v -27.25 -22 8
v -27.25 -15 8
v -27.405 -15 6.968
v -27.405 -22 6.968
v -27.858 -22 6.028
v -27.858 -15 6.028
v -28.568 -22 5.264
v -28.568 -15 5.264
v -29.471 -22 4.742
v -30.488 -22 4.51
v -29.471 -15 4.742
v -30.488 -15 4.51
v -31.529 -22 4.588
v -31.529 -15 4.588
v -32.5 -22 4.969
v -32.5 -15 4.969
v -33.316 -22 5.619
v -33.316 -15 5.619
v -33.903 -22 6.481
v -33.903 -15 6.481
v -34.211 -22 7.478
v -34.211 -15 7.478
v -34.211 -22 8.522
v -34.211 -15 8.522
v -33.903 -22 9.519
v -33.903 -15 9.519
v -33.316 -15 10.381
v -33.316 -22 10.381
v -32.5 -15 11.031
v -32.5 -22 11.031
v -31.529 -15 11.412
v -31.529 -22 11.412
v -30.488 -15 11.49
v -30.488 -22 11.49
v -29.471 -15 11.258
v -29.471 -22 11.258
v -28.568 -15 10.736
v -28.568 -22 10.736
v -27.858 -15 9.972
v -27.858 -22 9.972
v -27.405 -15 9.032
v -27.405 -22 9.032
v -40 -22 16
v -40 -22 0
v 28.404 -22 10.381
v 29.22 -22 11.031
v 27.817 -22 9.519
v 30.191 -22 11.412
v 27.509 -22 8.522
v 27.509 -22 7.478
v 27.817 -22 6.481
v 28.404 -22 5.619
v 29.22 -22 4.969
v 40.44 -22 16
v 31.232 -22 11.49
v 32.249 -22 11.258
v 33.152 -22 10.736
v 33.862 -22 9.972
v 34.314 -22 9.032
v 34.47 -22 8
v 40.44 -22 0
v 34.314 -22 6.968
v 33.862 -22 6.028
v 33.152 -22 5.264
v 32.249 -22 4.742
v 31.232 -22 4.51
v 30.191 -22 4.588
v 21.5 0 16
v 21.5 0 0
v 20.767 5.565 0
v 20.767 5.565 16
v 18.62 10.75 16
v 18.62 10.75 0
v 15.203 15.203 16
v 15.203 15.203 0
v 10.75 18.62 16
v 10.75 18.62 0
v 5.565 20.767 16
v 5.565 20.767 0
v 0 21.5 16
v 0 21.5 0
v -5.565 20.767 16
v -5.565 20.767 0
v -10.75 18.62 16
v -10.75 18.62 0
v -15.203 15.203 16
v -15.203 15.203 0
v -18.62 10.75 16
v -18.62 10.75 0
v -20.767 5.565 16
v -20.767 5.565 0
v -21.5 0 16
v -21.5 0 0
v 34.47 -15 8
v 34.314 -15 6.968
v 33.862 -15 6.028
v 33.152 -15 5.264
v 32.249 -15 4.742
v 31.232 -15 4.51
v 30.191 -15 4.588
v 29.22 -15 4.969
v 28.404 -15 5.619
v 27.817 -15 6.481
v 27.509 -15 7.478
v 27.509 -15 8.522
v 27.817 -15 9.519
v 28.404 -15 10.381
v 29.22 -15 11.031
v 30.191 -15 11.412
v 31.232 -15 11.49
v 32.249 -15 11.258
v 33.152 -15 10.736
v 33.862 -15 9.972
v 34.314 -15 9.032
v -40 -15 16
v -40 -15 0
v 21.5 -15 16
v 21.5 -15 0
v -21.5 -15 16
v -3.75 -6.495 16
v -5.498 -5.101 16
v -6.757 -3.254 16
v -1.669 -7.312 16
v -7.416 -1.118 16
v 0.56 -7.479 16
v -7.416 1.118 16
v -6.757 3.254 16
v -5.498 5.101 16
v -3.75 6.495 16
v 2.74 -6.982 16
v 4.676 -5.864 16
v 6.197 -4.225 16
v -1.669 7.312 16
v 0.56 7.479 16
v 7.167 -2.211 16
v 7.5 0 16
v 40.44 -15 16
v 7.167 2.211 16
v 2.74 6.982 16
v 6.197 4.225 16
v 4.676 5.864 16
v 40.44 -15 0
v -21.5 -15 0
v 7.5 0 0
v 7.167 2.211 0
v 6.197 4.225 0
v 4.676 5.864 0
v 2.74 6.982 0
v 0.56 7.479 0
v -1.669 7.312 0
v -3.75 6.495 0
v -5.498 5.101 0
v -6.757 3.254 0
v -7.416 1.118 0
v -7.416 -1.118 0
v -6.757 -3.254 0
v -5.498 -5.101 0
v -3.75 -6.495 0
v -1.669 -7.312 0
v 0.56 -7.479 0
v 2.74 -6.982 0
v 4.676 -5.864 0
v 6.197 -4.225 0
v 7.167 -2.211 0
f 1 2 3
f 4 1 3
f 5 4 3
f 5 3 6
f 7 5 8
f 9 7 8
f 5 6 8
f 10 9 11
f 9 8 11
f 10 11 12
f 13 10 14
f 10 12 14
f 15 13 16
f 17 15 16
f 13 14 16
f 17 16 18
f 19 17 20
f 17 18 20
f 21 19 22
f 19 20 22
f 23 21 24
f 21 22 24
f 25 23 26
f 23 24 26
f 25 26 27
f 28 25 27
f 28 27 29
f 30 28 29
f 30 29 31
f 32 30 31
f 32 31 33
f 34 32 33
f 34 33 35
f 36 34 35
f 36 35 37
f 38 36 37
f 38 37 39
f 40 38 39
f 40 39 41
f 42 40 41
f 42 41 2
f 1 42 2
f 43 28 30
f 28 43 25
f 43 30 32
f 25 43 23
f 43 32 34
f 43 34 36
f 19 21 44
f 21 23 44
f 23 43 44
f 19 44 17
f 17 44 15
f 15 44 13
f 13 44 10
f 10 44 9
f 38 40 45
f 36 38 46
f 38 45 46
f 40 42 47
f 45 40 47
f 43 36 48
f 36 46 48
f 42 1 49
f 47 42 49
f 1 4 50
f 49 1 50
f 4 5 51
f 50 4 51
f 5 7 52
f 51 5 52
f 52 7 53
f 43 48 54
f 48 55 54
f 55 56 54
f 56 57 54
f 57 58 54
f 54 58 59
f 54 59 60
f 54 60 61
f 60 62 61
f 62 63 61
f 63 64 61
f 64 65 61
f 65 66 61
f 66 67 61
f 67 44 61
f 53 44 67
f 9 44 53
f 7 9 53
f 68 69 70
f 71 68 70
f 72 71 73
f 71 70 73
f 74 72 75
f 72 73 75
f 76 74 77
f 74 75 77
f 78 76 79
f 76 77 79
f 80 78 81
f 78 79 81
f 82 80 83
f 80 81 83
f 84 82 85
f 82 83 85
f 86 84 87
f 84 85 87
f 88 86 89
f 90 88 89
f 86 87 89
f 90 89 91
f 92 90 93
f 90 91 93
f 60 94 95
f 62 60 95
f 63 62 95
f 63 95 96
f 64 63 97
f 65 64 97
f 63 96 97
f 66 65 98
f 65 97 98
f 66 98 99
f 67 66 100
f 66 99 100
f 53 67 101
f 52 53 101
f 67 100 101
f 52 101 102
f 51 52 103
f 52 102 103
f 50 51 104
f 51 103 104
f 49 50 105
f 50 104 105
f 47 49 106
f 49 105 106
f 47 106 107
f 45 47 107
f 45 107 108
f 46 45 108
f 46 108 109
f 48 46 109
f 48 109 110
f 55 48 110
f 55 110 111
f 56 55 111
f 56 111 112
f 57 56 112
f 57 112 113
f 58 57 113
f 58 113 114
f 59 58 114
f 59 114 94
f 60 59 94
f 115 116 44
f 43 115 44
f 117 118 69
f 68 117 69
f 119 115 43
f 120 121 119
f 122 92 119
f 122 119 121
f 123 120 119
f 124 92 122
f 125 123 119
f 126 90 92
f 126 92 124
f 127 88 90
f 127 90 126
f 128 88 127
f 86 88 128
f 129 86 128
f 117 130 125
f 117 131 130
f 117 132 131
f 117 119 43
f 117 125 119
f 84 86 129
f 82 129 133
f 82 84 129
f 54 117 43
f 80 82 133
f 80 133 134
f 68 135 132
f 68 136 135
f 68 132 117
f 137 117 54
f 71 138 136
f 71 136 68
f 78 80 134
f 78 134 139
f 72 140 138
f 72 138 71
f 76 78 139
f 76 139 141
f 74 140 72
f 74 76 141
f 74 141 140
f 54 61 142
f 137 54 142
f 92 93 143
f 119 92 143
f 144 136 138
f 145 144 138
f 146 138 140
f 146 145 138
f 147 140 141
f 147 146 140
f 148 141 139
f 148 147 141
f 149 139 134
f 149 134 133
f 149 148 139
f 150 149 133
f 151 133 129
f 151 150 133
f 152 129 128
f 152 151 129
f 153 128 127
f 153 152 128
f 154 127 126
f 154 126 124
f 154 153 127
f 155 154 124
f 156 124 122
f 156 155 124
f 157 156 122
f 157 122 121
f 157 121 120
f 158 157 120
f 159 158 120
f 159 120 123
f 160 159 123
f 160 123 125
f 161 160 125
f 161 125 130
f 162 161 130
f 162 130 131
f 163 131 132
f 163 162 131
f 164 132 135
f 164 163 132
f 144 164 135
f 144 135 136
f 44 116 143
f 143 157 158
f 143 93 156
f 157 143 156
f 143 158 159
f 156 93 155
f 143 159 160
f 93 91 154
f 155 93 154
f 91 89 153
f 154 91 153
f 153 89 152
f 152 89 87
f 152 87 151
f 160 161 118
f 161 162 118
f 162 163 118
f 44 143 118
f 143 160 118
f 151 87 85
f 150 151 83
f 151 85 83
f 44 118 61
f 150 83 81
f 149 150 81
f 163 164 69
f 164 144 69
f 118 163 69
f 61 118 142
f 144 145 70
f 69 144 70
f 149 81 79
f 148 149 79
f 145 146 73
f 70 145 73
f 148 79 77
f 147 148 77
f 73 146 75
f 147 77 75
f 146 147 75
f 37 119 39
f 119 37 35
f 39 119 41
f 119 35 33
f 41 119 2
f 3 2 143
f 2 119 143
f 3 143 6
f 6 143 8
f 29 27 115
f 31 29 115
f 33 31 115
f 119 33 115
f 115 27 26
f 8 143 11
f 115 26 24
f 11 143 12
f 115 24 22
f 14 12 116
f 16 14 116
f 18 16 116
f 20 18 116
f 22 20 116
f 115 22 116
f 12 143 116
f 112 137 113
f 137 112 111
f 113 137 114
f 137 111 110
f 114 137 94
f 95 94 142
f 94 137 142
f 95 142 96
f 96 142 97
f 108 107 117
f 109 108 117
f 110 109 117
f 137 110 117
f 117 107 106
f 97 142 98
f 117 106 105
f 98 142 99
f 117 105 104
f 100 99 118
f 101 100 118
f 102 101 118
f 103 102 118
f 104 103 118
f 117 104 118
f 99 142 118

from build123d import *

# Parameters (mm, degrees)
SKETCH_1_R          = 7.5
EXTRUDE_2_DEPTH     = 16
SKETCH_2_R          = 3.5
CUT_EXTRUDE_1_DEPTH = 16


with BuildPart() as part:
    # 草图1 → 凸台-拉伸2 (new body)
    with BuildSketch(Plane.XY):
        with BuildLine():
            Line((15.402921801, -15), (21.5, -15))
            Line((21.5, -15), (21.5, 0))
            ThreePointArc((21.5, 0), (19.917490037, -8.095899619), (15.402921801, -15))
        make_face()
        with BuildLine():
            ThreePointArc((21.5, 0), (0, 21.5), (-21.5, 0))
            ThreePointArc((-21.5, 0), (-19.917490037, -8.095899619), (-15.402921801, -15))
            Line((-15.402921801, -15), (15.402921801, -15))
            ThreePointArc((15.402921801, -15), (19.917490037, -8.095899619), (21.5, 0))
        make_face()
        Circle(SKETCH_1_R, mode=Mode.SUBTRACT)
        with BuildLine():
            Line((-21.5, 0), (-21.5, -15))
            Line((-21.5, -15), (-15.402921801, -15))
            ThreePointArc((-15.402921801, -15), (-19.917490037, -8.095899619), (-21.5, 0))
        make_face()
        with BuildLine():
            Line((-40, -22), (0, -22))
            Line((0, -22), (40, -22))
            Line((40, -22), (40.439940075, -22))
            Line((40.439940075, -22), (40.439940075, -15))
            Line((40.439940075, -15), (21.5, -15))
            Line((21.5, -15), (15.402921801, -15))
            ThreePointArc((15.402921801, -15), (0, -21.5), (-15.402921801, -15))
            Line((-15.402921801, -15), (-21.5, -15))
            Line((-21.5, -15), (-40, -15))
            Line((-40, -15), (-40, -22))
        make_face()
        with BuildLine():
            Line((15.402921801, -15), (-15.402921801, -15))
            ThreePointArc((-15.402921801, -15), (0, -21.5), (15.402921801, -15))
        make_face()
    extrude(amount=EXTRUDE_2_DEPTH)

    # 草图2 → 切除-拉伸1 (cut)
    with BuildSketch(Plane(origin=(0, -15, 0), x_dir=(1, 0, 0), z_dir=(0, 1, 0))):
        with Locations((-30.75, -8)):
            Circle(SKETCH_2_R)
        with Locations((30.969970037, -8)):
            Circle(SKETCH_2_R)
    extrude(amount=-CUT_EXTRUDE_1_DEPTH, mode=Mode.SUBTRACT)


solid = part.part
